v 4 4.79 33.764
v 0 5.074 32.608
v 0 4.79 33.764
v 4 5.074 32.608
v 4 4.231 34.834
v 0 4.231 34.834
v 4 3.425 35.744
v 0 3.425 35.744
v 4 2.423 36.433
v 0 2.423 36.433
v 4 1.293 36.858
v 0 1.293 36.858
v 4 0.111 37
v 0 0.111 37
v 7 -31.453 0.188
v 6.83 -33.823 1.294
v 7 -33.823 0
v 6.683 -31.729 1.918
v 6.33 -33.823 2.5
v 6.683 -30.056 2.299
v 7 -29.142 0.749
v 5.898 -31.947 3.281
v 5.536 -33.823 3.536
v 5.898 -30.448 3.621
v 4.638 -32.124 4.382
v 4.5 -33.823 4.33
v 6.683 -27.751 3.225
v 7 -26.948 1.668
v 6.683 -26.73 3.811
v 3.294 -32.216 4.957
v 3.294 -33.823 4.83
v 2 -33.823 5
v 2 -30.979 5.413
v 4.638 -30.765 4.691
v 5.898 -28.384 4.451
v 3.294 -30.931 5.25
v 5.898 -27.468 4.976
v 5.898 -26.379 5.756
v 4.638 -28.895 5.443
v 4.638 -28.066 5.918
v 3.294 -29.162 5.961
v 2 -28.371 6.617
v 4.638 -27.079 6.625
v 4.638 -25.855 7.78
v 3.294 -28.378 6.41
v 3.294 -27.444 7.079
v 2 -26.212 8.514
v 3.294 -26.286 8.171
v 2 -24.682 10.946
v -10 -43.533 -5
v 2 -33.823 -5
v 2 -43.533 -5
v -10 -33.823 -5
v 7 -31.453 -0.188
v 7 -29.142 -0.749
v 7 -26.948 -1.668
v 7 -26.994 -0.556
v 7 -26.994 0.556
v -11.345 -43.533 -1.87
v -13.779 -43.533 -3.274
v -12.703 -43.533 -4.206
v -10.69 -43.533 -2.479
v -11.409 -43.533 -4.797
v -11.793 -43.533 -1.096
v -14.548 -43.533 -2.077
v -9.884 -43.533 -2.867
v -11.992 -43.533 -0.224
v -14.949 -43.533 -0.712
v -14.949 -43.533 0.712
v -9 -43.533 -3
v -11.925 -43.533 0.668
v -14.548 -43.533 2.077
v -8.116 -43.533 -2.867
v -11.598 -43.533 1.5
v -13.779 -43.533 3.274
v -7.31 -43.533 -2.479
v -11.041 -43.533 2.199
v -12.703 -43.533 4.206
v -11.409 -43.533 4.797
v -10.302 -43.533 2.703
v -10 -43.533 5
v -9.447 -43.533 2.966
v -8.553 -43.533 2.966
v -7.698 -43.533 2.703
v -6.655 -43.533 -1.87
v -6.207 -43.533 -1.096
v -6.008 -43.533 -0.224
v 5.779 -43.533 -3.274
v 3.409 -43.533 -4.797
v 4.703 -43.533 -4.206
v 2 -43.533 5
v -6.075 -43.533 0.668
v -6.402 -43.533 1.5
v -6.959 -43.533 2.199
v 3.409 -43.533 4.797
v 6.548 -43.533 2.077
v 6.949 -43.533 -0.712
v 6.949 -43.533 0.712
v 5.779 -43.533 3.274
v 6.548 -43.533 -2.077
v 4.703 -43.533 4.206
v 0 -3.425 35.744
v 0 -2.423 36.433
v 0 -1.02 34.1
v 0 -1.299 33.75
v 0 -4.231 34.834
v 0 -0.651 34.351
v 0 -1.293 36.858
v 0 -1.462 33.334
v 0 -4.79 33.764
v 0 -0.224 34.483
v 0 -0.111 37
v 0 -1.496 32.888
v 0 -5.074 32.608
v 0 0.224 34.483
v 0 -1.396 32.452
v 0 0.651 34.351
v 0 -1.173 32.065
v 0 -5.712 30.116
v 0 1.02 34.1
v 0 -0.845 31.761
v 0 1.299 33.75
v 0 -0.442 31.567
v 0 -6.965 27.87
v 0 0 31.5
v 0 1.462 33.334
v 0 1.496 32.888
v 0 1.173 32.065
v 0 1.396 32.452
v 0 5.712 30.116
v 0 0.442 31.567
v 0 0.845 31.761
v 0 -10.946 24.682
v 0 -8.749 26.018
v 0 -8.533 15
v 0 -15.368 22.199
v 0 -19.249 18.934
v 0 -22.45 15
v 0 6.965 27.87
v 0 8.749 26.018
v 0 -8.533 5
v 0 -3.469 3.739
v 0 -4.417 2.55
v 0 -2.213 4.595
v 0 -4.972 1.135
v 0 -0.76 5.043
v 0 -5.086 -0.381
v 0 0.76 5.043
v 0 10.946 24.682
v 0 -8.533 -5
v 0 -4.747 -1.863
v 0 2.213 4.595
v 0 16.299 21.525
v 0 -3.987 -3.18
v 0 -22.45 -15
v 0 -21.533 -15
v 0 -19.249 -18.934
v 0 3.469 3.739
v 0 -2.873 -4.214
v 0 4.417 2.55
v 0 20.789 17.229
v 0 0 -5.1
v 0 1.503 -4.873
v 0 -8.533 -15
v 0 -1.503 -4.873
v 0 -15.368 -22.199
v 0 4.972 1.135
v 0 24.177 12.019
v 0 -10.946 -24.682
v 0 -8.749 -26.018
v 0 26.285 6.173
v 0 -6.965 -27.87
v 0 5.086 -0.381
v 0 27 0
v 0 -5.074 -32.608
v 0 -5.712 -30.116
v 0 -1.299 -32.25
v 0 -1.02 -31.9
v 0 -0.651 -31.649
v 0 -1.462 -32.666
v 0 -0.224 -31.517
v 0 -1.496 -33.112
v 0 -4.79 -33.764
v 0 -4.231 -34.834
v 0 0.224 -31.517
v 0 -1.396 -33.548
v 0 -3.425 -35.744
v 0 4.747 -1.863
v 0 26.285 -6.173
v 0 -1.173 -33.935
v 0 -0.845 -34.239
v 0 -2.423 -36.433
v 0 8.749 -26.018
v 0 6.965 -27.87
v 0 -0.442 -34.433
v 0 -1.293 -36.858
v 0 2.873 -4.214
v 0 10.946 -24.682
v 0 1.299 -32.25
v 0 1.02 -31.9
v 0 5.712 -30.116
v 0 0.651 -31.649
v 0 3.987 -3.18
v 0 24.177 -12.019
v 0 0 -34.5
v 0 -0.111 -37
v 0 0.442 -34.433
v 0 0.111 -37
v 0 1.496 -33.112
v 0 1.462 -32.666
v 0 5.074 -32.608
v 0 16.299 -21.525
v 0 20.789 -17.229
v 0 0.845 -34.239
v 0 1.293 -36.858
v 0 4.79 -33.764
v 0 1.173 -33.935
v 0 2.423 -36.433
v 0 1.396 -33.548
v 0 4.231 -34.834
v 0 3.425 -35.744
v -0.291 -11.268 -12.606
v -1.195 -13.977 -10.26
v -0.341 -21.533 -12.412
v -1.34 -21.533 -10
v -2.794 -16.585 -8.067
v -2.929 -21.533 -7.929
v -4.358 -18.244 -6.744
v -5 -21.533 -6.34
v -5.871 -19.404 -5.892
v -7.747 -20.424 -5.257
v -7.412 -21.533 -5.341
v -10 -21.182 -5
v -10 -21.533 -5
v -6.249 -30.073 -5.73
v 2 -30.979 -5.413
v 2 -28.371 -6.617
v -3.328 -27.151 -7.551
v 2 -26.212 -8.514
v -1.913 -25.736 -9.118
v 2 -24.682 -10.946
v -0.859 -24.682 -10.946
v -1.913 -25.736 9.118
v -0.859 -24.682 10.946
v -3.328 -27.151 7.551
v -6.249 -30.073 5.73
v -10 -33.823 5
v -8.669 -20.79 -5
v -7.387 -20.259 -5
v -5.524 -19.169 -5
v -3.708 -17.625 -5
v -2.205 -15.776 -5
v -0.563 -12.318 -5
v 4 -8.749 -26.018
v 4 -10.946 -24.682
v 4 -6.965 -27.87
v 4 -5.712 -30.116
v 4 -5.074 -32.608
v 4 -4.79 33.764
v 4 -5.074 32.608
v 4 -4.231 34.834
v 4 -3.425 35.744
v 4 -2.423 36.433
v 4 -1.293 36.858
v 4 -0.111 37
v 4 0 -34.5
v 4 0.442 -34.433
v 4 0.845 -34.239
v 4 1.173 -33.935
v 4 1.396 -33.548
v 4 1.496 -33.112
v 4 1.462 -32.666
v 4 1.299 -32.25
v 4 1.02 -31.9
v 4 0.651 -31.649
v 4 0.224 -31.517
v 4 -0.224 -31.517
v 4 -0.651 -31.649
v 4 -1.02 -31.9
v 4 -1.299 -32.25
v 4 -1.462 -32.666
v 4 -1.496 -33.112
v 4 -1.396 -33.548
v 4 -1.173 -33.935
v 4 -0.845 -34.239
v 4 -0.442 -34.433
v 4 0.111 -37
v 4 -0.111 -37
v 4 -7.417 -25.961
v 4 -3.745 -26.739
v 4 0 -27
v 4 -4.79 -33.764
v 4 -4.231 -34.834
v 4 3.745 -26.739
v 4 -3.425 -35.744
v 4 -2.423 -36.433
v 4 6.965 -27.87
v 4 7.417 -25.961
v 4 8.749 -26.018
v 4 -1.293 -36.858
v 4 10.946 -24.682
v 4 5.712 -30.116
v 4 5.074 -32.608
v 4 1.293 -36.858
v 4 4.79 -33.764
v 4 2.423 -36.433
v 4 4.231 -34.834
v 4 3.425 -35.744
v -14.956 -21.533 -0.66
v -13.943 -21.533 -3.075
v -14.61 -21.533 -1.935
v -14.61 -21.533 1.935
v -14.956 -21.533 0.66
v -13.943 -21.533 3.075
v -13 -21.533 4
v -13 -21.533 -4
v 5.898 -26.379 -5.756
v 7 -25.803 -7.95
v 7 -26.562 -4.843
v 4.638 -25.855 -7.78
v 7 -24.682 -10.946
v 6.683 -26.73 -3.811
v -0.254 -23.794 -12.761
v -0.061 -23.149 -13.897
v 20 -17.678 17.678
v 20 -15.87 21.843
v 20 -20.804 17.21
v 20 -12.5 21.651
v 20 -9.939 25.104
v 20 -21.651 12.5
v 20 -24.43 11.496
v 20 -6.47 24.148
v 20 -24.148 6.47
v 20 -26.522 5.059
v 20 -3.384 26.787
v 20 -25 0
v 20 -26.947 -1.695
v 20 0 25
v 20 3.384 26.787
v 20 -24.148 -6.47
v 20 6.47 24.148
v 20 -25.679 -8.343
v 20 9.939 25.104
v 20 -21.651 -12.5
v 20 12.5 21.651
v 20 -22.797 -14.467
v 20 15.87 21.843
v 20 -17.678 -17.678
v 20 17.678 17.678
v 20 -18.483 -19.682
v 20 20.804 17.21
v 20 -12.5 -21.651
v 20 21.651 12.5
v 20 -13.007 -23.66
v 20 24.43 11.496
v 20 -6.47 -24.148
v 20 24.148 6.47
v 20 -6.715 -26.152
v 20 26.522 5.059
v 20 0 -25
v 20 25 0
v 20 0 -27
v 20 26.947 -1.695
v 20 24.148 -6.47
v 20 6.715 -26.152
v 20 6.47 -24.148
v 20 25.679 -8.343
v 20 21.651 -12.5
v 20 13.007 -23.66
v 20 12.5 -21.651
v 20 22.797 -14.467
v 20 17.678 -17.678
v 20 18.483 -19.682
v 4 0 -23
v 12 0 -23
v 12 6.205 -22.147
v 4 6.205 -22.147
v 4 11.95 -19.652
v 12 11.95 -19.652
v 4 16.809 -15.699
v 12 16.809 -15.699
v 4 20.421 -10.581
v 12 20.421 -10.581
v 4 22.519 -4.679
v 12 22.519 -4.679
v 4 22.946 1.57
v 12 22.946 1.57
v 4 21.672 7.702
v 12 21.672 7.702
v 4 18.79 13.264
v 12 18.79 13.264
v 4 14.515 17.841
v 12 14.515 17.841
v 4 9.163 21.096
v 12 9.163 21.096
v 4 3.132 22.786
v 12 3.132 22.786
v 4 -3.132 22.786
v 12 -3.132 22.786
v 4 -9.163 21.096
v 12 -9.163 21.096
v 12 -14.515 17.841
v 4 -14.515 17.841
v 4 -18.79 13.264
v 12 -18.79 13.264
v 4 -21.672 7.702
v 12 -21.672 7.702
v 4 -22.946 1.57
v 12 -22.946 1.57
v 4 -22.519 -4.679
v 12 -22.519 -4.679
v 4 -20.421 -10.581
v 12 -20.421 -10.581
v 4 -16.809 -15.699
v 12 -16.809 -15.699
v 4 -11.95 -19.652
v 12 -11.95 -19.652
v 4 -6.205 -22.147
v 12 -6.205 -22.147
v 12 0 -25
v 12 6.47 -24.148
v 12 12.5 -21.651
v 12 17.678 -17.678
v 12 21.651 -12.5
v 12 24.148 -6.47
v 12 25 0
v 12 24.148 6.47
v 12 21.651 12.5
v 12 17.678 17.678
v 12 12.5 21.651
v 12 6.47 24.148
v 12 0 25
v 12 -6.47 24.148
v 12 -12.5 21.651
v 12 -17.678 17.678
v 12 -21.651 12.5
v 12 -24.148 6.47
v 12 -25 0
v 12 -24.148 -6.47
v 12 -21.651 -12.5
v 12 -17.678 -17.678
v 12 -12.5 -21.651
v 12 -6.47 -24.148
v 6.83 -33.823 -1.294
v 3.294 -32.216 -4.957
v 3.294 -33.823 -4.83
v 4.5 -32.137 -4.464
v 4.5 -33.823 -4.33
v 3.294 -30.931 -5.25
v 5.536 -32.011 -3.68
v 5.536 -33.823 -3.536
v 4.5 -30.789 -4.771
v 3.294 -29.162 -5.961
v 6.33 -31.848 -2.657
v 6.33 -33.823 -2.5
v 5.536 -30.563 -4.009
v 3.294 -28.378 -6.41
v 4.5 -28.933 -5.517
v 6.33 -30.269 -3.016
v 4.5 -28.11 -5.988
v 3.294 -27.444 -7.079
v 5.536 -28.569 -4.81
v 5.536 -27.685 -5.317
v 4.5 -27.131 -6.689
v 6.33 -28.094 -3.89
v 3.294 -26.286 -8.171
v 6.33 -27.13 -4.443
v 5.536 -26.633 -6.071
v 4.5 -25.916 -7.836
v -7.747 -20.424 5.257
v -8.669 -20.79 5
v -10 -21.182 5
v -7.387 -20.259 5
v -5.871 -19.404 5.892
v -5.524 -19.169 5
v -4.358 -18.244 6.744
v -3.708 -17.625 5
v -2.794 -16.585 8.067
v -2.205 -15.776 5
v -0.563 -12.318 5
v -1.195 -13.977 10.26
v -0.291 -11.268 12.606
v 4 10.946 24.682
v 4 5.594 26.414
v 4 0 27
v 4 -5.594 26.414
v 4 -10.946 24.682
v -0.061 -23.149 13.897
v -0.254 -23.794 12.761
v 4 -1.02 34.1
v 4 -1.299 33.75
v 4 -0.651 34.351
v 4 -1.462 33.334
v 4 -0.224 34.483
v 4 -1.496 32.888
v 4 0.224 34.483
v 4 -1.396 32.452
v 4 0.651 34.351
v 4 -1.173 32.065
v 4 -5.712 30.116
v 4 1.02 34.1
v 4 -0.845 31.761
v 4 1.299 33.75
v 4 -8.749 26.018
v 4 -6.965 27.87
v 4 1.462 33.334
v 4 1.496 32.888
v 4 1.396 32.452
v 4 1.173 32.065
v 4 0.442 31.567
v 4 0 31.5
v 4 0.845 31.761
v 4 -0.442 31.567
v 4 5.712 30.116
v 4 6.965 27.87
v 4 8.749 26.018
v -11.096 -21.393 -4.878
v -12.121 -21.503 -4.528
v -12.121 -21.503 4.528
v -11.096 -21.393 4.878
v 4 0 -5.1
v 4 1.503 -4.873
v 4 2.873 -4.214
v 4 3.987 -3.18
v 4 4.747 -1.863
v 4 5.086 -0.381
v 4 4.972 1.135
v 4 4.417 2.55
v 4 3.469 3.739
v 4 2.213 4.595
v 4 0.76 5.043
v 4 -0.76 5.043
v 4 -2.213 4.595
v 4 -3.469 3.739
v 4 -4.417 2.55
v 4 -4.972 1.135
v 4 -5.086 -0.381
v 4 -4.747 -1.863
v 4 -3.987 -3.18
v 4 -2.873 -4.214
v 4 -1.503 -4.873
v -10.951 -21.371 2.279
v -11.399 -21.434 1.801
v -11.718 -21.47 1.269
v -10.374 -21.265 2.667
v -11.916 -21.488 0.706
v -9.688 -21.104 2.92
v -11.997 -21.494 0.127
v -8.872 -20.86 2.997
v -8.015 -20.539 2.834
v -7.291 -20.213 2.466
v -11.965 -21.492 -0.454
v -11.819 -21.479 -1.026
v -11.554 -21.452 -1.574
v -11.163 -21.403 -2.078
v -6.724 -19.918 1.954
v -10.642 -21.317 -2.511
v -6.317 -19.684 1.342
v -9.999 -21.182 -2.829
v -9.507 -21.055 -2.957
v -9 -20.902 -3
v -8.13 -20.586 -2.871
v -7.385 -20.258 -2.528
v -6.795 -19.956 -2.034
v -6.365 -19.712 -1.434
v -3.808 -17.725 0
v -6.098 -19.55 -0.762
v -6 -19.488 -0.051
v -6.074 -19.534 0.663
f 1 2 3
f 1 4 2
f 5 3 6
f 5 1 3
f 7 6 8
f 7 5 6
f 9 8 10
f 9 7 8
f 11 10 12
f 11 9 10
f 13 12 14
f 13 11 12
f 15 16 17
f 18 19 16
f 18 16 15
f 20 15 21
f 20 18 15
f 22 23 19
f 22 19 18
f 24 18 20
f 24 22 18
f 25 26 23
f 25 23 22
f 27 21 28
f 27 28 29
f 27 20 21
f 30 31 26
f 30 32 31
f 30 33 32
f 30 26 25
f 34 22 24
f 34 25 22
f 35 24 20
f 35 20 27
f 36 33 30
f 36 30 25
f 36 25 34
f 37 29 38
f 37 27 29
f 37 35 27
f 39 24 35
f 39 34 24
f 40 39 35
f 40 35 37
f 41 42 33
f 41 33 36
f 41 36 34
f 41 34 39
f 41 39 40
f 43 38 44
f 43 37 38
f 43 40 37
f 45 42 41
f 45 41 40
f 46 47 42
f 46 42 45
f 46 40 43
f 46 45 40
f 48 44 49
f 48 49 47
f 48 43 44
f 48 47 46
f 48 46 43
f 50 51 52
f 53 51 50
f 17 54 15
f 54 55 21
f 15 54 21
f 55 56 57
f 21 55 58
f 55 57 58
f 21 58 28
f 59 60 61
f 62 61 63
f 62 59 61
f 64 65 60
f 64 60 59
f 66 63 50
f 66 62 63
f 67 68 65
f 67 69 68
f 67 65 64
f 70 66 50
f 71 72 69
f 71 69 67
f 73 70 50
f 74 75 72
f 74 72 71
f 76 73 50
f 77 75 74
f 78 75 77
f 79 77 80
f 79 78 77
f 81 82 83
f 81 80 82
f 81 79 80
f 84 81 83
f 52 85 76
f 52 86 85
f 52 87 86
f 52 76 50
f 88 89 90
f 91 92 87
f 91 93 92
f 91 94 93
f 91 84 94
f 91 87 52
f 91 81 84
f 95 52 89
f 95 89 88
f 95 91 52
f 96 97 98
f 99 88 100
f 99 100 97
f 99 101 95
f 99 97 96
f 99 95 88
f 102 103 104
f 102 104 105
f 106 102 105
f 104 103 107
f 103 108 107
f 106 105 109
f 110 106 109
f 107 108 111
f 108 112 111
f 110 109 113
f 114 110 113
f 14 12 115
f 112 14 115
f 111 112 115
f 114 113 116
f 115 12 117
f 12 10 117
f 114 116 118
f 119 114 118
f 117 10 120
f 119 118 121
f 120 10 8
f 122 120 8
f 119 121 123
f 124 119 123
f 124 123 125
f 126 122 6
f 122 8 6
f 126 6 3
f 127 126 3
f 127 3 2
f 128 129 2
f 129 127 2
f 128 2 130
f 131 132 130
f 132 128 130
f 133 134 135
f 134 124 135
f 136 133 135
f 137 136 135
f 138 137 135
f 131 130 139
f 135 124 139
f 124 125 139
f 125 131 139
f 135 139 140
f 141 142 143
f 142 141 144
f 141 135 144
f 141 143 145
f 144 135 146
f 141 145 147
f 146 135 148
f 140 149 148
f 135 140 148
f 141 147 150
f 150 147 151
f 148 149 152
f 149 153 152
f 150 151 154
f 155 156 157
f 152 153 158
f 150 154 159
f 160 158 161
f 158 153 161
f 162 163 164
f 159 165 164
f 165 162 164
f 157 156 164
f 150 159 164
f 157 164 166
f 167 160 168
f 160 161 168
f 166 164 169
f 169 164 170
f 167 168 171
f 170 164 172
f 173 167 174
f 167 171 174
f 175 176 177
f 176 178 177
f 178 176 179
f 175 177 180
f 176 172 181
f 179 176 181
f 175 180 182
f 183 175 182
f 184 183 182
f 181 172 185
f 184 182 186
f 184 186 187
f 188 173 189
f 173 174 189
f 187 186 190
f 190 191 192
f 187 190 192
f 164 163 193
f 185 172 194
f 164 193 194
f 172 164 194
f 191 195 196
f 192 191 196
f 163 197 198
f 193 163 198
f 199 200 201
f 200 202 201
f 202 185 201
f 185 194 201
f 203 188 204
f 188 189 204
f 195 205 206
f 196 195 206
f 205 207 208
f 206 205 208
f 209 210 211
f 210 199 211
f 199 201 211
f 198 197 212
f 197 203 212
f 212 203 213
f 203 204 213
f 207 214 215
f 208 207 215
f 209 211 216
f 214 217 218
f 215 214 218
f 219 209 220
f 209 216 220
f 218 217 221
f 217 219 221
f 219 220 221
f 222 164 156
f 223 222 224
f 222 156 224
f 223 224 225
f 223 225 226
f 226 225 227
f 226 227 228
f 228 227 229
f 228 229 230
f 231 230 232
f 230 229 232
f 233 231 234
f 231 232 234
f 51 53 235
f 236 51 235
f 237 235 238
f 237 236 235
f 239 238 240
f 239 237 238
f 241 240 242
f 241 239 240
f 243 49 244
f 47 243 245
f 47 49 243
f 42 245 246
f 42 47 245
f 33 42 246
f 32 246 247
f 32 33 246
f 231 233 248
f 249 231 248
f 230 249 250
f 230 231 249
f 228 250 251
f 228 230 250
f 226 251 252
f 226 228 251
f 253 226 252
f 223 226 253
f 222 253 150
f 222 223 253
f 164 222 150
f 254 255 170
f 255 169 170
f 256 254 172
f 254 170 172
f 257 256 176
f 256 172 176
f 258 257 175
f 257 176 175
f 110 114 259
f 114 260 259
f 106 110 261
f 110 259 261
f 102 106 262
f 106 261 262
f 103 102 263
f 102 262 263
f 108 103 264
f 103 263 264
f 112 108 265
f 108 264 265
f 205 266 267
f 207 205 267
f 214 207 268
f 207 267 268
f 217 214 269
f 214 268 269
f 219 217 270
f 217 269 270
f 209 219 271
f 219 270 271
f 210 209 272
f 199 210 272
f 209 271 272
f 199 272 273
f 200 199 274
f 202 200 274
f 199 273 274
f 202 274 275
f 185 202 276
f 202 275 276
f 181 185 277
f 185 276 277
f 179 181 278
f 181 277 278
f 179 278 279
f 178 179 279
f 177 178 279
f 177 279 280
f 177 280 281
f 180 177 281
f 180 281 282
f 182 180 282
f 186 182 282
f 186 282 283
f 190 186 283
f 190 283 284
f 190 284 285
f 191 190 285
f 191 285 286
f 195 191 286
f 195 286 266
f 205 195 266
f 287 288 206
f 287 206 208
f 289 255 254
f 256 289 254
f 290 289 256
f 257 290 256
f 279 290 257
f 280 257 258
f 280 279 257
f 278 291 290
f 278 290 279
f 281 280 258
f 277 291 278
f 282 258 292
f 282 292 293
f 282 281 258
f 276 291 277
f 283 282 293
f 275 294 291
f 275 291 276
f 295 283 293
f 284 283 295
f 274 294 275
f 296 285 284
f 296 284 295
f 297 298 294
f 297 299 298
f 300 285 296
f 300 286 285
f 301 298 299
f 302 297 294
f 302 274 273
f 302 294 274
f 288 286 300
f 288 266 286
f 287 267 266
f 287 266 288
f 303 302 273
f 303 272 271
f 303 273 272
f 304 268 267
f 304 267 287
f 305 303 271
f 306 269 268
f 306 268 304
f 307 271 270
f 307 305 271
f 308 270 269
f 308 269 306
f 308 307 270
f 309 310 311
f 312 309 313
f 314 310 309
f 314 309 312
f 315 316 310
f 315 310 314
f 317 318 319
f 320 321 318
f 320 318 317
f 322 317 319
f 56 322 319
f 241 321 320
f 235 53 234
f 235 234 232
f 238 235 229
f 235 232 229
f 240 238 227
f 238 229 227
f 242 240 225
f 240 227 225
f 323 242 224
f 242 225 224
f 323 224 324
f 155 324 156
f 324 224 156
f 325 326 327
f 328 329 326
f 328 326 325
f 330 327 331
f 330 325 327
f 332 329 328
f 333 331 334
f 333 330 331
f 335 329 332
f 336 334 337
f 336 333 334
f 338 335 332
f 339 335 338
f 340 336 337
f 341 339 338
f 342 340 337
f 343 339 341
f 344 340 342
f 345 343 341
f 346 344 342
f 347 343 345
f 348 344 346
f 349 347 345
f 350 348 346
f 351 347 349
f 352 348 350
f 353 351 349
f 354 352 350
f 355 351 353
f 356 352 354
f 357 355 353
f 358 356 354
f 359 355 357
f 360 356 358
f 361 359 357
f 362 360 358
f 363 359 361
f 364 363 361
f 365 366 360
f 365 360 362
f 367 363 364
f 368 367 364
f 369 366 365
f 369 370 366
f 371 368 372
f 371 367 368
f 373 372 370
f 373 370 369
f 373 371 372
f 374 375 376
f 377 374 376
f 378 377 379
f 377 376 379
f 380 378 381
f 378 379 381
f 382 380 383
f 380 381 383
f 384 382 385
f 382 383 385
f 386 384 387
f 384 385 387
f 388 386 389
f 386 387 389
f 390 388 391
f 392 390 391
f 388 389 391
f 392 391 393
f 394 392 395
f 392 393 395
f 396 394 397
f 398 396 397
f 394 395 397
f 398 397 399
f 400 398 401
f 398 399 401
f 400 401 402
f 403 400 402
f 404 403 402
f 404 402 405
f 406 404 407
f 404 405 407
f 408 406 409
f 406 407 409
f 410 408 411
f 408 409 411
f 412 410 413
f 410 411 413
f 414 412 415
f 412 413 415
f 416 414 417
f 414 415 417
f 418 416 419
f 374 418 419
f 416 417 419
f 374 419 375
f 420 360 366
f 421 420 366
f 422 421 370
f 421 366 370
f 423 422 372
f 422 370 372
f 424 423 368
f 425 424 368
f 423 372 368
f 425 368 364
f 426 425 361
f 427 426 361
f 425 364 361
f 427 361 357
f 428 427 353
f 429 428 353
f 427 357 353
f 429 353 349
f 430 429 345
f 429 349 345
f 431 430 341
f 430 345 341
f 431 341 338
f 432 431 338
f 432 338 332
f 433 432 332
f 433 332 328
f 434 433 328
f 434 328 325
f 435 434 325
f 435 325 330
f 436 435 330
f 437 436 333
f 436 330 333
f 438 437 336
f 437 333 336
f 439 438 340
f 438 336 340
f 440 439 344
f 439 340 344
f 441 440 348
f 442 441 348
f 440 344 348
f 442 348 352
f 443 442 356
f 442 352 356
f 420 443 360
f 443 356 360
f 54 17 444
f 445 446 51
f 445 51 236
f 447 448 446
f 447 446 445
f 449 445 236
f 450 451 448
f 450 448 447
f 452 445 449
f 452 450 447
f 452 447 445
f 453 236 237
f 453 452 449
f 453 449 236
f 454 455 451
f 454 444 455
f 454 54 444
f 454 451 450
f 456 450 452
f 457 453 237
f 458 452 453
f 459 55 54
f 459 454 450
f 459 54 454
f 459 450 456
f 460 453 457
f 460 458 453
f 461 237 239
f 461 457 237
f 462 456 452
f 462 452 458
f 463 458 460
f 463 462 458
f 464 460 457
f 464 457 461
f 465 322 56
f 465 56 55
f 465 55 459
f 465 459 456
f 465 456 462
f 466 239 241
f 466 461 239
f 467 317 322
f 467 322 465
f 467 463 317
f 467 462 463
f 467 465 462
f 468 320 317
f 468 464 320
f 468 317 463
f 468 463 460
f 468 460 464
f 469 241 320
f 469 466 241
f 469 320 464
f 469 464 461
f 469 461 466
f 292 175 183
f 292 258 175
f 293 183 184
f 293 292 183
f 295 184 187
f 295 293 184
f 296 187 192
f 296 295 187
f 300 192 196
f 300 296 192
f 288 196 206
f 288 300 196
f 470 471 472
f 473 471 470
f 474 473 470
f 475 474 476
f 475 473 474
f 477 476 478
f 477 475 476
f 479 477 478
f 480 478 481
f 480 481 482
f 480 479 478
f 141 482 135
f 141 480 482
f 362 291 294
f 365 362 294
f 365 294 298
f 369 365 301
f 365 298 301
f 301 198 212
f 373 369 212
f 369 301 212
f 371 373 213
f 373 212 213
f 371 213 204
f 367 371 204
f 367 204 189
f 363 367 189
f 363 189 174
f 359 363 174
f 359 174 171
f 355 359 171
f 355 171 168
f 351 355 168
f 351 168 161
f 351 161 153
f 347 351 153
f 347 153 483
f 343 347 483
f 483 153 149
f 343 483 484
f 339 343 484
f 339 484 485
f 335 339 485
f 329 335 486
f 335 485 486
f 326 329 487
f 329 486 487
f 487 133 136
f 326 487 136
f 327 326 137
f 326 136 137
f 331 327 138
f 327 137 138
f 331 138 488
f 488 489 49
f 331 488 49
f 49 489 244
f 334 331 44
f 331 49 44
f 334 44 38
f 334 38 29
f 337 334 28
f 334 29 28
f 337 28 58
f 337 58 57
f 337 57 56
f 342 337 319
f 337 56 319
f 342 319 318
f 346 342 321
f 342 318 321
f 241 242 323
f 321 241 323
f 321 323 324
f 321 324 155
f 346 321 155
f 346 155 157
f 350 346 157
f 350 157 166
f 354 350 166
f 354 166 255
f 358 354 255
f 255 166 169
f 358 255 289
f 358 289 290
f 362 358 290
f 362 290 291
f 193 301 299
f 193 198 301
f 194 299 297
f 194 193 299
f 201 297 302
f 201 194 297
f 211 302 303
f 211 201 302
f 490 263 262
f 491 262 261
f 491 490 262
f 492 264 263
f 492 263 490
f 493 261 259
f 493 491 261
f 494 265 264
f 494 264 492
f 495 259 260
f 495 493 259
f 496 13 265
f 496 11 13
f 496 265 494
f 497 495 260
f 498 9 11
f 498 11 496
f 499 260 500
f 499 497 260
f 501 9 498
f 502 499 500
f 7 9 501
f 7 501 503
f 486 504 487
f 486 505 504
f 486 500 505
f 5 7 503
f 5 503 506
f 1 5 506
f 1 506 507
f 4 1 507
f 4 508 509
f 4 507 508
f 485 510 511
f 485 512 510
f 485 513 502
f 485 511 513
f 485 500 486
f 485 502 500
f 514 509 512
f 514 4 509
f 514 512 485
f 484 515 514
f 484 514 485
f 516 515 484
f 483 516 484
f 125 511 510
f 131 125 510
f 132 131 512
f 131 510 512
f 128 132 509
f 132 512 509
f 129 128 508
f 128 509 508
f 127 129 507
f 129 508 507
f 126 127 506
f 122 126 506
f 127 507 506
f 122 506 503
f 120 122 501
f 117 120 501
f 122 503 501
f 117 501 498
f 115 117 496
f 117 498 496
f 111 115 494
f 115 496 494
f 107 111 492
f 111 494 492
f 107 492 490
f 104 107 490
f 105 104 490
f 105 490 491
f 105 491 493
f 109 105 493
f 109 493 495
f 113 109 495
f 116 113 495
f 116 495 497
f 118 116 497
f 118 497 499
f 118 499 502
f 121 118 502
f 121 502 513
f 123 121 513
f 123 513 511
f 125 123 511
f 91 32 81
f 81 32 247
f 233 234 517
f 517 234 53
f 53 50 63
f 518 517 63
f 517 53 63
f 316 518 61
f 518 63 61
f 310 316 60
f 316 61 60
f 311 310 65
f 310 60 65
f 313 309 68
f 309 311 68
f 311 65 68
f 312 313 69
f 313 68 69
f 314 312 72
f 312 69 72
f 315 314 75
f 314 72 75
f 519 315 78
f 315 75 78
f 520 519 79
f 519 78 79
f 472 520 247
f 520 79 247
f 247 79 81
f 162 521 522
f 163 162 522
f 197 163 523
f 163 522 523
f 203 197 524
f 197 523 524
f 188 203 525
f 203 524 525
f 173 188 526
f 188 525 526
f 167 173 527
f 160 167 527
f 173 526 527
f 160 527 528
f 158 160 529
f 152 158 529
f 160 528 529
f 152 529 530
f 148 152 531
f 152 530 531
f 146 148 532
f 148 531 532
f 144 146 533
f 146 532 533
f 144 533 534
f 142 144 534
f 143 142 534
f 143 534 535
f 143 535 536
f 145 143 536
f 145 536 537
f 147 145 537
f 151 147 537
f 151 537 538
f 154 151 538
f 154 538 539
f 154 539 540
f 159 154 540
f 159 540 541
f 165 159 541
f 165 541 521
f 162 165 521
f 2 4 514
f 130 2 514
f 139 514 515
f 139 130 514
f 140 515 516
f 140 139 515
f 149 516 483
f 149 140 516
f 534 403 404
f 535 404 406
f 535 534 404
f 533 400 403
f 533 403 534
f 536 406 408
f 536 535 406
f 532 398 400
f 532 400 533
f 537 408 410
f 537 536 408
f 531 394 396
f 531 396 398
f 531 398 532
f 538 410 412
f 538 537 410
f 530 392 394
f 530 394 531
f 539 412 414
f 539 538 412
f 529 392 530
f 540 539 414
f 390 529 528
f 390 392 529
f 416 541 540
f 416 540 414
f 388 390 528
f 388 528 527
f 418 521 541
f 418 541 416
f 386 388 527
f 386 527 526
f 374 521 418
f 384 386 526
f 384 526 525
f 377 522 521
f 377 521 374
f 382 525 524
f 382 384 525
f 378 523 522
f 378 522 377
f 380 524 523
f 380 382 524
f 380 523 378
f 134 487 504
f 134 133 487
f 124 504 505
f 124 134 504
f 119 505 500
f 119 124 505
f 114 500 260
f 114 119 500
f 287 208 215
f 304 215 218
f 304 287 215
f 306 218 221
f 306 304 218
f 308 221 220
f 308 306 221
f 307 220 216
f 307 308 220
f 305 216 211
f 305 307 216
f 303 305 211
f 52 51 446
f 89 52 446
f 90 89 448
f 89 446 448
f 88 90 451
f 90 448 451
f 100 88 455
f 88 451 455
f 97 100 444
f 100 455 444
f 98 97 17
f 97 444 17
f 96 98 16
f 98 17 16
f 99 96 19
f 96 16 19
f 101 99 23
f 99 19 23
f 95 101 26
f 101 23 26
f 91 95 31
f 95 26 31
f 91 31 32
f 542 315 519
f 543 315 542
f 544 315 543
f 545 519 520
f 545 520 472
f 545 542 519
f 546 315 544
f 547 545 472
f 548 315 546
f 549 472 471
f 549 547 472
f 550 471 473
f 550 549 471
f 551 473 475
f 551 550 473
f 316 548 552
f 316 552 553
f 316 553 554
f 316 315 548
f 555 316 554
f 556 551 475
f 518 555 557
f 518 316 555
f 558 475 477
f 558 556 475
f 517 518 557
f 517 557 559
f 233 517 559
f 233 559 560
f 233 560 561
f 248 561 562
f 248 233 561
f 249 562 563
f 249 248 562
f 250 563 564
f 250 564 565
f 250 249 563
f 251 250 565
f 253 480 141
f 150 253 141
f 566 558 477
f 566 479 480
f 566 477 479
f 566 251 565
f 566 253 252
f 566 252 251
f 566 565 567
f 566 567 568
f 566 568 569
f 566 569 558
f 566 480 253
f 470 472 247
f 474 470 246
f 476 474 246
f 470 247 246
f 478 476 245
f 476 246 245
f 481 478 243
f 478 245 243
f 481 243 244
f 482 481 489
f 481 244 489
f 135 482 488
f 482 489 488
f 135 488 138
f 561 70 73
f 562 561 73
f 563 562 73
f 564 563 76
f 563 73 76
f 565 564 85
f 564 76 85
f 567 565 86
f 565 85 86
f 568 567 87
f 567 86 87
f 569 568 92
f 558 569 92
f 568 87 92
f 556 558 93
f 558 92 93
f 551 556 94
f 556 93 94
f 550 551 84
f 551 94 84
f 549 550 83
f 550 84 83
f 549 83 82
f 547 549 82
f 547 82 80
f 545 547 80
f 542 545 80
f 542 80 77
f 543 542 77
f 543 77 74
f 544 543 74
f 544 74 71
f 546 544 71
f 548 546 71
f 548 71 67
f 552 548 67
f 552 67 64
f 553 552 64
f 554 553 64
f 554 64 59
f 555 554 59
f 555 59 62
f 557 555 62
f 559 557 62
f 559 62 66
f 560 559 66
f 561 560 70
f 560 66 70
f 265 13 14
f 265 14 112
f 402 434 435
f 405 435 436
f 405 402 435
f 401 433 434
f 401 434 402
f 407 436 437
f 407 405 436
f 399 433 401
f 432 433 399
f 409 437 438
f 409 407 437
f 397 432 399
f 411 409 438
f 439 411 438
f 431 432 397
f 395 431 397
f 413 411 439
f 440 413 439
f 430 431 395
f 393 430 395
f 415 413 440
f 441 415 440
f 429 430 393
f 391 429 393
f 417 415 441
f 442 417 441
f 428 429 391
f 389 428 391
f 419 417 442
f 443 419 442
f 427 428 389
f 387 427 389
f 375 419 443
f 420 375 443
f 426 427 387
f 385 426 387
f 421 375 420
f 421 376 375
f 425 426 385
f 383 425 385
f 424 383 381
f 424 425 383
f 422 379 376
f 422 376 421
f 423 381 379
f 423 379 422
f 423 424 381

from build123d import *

# Parameters (mm, degrees)
SKETCH_1_R          = 27
EXTRUDE_1_DEPTH     = 20
EXTRUDE_2_DEPTH     = 4
SKETCH_2_R          = 25
CUT_EXTRUDE_1_DEPTH = 8
SKETCH_3_R          = 23
CUT_EXTRUDE_2_DEPTH = 8
CUT_EXTRUDE_5_REACH = 50.518
SKETCH_8_R          = 5.1
CUT_EXTRUDE_6_REACH = 50.518
SKETCH_11_R         = 1.5
FILLET_1_R          = 10
FILLET_2_R          = 5
SKETCH_12_W         = 10
SKETCH_12_H         = 5
EXTRUDE_3_DEPTH     = 15
SKETCH_13_W         = 22
SKETCH_13_H         = 10
EXTRUDE_4_DEPTH     = 17
FILLET_3_R          = 10
FILLET_START        = -21.532998323
FILLET_4_DEPTH      = 0.497094834
FILLET_START_2      = -21.035903489
FILLET_4_2_DEPTH    = 12.502905266
FILLET_START_3      = -37
FILLET_4_3_DEPTH    = 74
FILLET_START_4      = -5
FILLET_4_4_DEPTH    = 10
CUT_EXTRUDE_7_REACH = 84.121
SKETCH_14_R         = 3
FILLET_5_R          = 5


with BuildPart() as part:
    # 草图1 → 凸台-拉伸1 (new body)
    with BuildSketch(Plane(origin=(0, 0, 0), x_dir=(0, 0, -1), z_dir=(1, 0, 0))):
        Circle(SKETCH_1_R)
    extrude(amount=EXTRUDE_1_DEPTH)

    # 草图10 → 凸台-拉伸2 (add)
    with BuildSketch(Plane.ZY):
        Polygon((0, 5), (37, 5), (37, -5), (0, -5), (-37, -5), (-37, 5), align=None)
    extrude(amount=-EXTRUDE_2_DEPTH)

    # 草图2 → 切除-拉伸1 (cut)
    with BuildSketch(Plane(origin=(20, 0, 0), x_dir=(0, 0, -1), z_dir=(1, 0, 0))):
        Circle(SKETCH_2_R)
    extrude(amount=-CUT_EXTRUDE_1_DEPTH, mode=Mode.SUBTRACT)

    # 草图3 → 切除-拉伸2 (cut)
    with BuildSketch(Plane(origin=(12, 0, 0), x_dir=(0, 0, -1), z_dir=(1, 0, 0))):
        Circle(SKETCH_3_R)
    extrude(amount=-CUT_EXTRUDE_2_DEPTH, mode=Mode.SUBTRACT)

    # 草图8 → 切除-拉伸5 (cut, up to next)
    with BuildSketch(Plane(origin=(4, 0, 0), x_dir=(0, 0, -1), z_dir=(1, 0, 0)), mode=Mode.PRIVATE) as cut_extrude_5_sk1:
        Circle(SKETCH_8_R)
    cut_extrude_5_tool1 = extrude(cut_extrude_5_sk1.sketch, amount=-CUT_EXTRUDE_5_REACH, mode=Mode.PRIVATE) & part.part
    add(cut_extrude_5_tool1.solids().sort_by_distance((4, 0, 0))[0], mode=Mode.SUBTRACT)

    # 草图11 → 切除-拉伸6 (cut, up to next)
    with BuildSketch(Plane(origin=(4, 0, 0), x_dir=(0, 0, -1), z_dir=(1, 0, 0)), mode=Mode.PRIVATE) as cut_extrude_6_sk1:
        with Locations((-33, 0)):
            Circle(SKETCH_11_R)
    cut_extrude_6_tool1 = extrude(cut_extrude_6_sk1.sketch, amount=-CUT_EXTRUDE_6_REACH, mode=Mode.PRIVATE) & part.part
    # 草图11 → 切除-拉伸6 (cut, up to next)
    with BuildSketch(Plane(origin=(4, 0, 0), x_dir=(0, 0, -1), z_dir=(1, 0, 0)), mode=Mode.PRIVATE) as cut_extrude_6_sk2:
        with Locations((33, 0)):
            Circle(SKETCH_11_R)
    cut_extrude_6_tool2 = extrude(cut_extrude_6_sk2.sketch, amount=-CUT_EXTRUDE_6_REACH, mode=Mode.PRIVATE) & part.part
    add(cut_extrude_6_tool1.solids().sort_by_distance((4, 0, 33))[0], mode=Mode.SUBTRACT)
    add(cut_extrude_6_tool2.solids().sort_by_distance((4, 0, -33))[0], mode=Mode.SUBTRACT)

    # 圆角1
    fillet_1_edges = [part.edges().sort_by_distance(p)[0] for p in [
        (2, 5, -26.532998323),
        (2, 5, 26.532998323),
        (2, -5, 26.532998323),
        (2, -5, -26.532998323),
    ]]
    fillet(fillet_1_edges, radius=FILLET_1_R)

    # 圆角2
    fillet_2_edges = [part.edges().sort_by_distance(p)[0] for p in [
        (2, 5, 37),
        (2, -5, 37),
        (2, -5, -37),
        (2, 5, -37),
    ]]
    fillet(fillet_2_edges, radius=FILLET_2_R)

    # 草图12 → 凸台-拉伸3 (add)
    with BuildSketch(Plane.ZY):
        with Locations((0, -24.032998323)):
            Rectangle(SKETCH_12_W, SKETCH_12_H)
    extrude(amount=EXTRUDE_3_DEPTH)

    # 草图13 → 凸台-拉伸4 (add)
    with BuildSketch(Plane.XZ.offset(26.532998323)):
        with Locations((-4, 0)):
            Rectangle(SKETCH_13_W, SKETCH_13_H)
    extrude(amount=EXTRUDE_4_DEPTH)

    # 圆角3
    fillet_3_edges = [part.edges().sort_by_distance(p)[0] for p in [
        (0, -24.032998323, -5),
        (0, -24.032998323, 5),
        (3.5, -26.532998323, -5),
        (3.5, -26.532998323, 5),
    ]]
    fillet(fillet_3_edges, radius=FILLET_3_R)

    # 圆角4: read off the stored shape, not the designer's step
    # 圆角4 outline → 圆角4 (add)
    with BuildSketch(Plane(origin=(0, 0, 0), x_dir=(1, 0, 0), z_dir=(0, 1, 0)).offset(FILLET_START)):
        with BuildLine():
            Line((0, -15), (0, -5))
            Line((0, -5), (-10, -5))
            ThreePointArc((-10, -5), (-2.928932188, -7.928932188), (0, -15))
        make_face()
        with BuildLine():
            ThreePointArc((0, 15), (-2.928932188, 7.928932188), (-10, 5))
            Line((-10, 5), (0, 5))
            Line((0, 5), (0, 15))
        make_face()
    extrude(amount=FILLET_4_DEPTH)

    # Fillet 4 2 outline → Fillet 4 2 (add)
    with BuildSketch(Plane(origin=(0, 0, 0), x_dir=(1, 0, 0), z_dir=(0, 1, 0)).offset(FILLET_START_2)):
        with BuildLine():
            Line((0, -15), (0, -5))
            Line((0, -5), (-10, -5))
            ThreePointArc((-10, -5), (-2.928932188, -7.928932188), (0, -15))
        make_face()
        with BuildLine():
            ThreePointArc((0, 15), (-2.928932188, 7.928932188), (-10, 5))
            Line((-10, 5), (0, 5))
            Line((0, 5), (0, 15))
        make_face()
    extrude(amount=FILLET_4_2_DEPTH)

    # Fillet 4 3 outline → Fillet 4 3 (cut)
    with BuildSketch(Plane.XY.offset(FILLET_START_3)):
        with BuildLine():
            Line((-15, -21.532998323), (-13, -21.532998323))
            add(Edge.make_bspline(
                [(-13, -21.532998323), (0, -21.532998323), (0, -8.532998323)],
                knots=[0, 0, 0, 1, 1, 1], degree=2, weights=[1, 0.707106781, 1]))
            Line((0, -8.532998323), (0, -7))
            Line((0, -7), (-15, -7))
            Line((-15, -7), (-15, -21.532998323))
        make_face()
    extrude(amount=FILLET_4_3_DEPTH, mode=Mode.SUBTRACT)

    # Fillet 4 4 outline → Fillet 4 4 (add)
    with BuildSketch(Plane.XY.offset(FILLET_START_4)):
        with BuildLine():
            add(Edge.make_bspline(
                [(-13, -21.532998323), (0, -21.532998323), (0, -8.532998323)],
                knots=[0, 0, 0, 1, 1, 1], degree=2, weights=[1, 0.707106781, 1]))
            Line((-13, -21.532998323), (0, -21.532998323))
            Line((0, -21.532998323), (0, -8.532998323))
        make_face()
    extrude(amount=FILLET_4_4_DEPTH)

    # 草图14 → 切除-拉伸7 (cut, up to next)
    with BuildSketch(Plane(origin=(0, -43.532998323, 0), x_dir=(-1, 0, 0), z_dir=(0, -1, 0)), mode=Mode.PRIVATE) as cut_extrude_7_sk1:
        with Locations(Location((9, 0, 0), (0, 0, 90))):
            Circle(SKETCH_14_R)
    cut_extrude_7_tool1 = extrude(cut_extrude_7_sk1.sketch, amount=-CUT_EXTRUDE_7_REACH, mode=Mode.PRIVATE) & part.part
    add(cut_extrude_7_tool1.solids().sort_by_distance((-9, -43.532998, 0))[0], mode=Mode.SUBTRACT)

    # 圆角5
    # the kernel refuses this fillet: 5 mm, written as the material it takes off along each edge
    with BuildSketch(Plane(origin=(7, -33.823069051, -15), x_dir=(0, 0, 1), z_dir=(0, -1, 0))) as fillet_5_piece_1_section:
        with BuildLine():
            CenterArc((10 + FILLET_5_R, FILLET_5_R), FILLET_5_R, 180, 90)
            Line((10 + FILLET_5_R, 0), (10, 0))
            Line((10, 0), (10, FILLET_5_R))
        make_face()
    fillet_5_piece_1 = revolve(axis=Axis((7, -33.823069051, -15), (-1, 0, 0)), revolution_arc=137.718699106, mode=Mode.PRIVATE)
    fillet_5_piece_1 = fillet_5_piece_1 - Plane(origin=(7, 0, 0), x_dir=(0, 0, -1), z_dir=(-1, 0, 0)) * Cylinder(27, 60, mode=Mode.PRIVATE)
    add(fillet_5_piece_1, mode=Mode.SUBTRACT)
    with BuildSketch(Plane(origin=(7, -33.823069051, 15), x_dir=(0, 0, -1), z_dir=(0, -1, 0))) as fillet_5_piece_2_section:
        with BuildLine():
            CenterArc((10 + FILLET_5_R, -FILLET_5_R), FILLET_5_R, 90, 90)
            Line((10 + FILLET_5_R, 0), (10, 0))
            Line((10, 0), (10, -FILLET_5_R))
        make_face()
    fillet_5_piece_2 = revolve(axis=Axis((7, -33.823069051, 15), (1, 0, 0)), revolution_arc=137.718699106, mode=Mode.PRIVATE)
    fillet_5_piece_2 = fillet_5_piece_2 - Plane(origin=(7, 0, 0), x_dir=(0, 0, -1), z_dir=(-1, 0, 0)) * Cylinder(27, 60, mode=Mode.PRIVATE)
    add(fillet_5_piece_2, mode=Mode.SUBTRACT)
    with BuildSketch(Plane(origin=(7, -33.823069051, -5), x_dir=(-1, 0, 0), z_dir=(0, -1, 0))) as fillet_5_piece_3:
        with BuildLine():
            CenterArc((FILLET_5_R, -FILLET_5_R), FILLET_5_R, 90, 90)
            Line((0, -FILLET_5_R), (0, 0))
            Line((0, 0), (FILLET_5_R, 0))
        make_face()
    extrude(amount=22.209929272, mode=Mode.SUBTRACT)
    with BuildSketch(Plane(origin=(7, -33.823069051, 5), x_dir=(-1, 0, 0), z_dir=(0, -1, 0))) as fillet_5_piece_4:
        with BuildLine():
            CenterArc((FILLET_5_R, FILLET_5_R), FILLET_5_R, 180, 90)
            Line((0, FILLET_5_R), (0, 0))
            Line((0, 0), (FILLET_5_R, 0))
        make_face()
    extrude(amount=22.209929272, mode=Mode.SUBTRACT)
    with BuildSketch(Plane(origin=(-15, -9.032998323, 5), x_dir=(1, 0, 0), z_dir=(0, -1, 0)), Plane(origin=(-15, -56.032998323, -5), x_dir=(1, 0, 0), z_dir=(0, 1, 0))) as fillet_5_piece_5:
        with BuildLine():
            CenterArc((FILLET_5_R, -FILLET_5_R), FILLET_5_R, 90, 90)
            Line((0, -FILLET_5_R), (0, 0))
            Line((0, 0), (FILLET_5_R, 0))
        make_face()
    extrude(amount=47, mode=Mode.SUBTRACT)


solid = part.part
